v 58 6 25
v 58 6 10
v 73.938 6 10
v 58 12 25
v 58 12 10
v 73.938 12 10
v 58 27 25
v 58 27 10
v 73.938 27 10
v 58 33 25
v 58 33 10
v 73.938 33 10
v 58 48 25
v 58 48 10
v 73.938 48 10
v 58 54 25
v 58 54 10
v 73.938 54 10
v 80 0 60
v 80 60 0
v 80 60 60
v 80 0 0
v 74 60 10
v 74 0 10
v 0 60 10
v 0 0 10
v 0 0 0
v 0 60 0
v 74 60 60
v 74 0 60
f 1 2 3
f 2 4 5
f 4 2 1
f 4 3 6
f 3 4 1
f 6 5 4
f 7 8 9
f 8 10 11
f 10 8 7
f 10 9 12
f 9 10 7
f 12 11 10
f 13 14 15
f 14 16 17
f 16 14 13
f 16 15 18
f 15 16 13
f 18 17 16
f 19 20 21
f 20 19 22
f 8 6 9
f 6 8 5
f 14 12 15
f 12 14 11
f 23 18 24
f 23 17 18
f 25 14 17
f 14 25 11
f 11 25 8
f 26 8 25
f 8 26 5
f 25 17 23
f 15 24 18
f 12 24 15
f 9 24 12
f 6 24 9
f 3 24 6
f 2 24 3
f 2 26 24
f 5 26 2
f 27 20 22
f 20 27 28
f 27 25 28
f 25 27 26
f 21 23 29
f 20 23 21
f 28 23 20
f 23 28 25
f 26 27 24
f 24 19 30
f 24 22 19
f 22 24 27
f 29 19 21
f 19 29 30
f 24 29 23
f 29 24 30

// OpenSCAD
$fn = 32;

// ----------------------------------------------------------------------
// Rib bracket: 3-gusset L bracket
// ----------------------------------------------------------------------

// --- parameters (mm) ---
base_l = 80;              // foot length, X
base_w = 60;              // foot width, Y
base_t = 10;              // foot thickness
plate_t = 6;              // upright plate thickness
plate_h = 60;             // overall height
gus_l = 16;               // gusset leg along the foot
gus_h = 16;               // gusset height
gus_t = 6;                // gusset thickness
gus_edge = 6;             // gusset margin from the foot edge
n_gus = 3;                // gusset count

gus_pitch = (base_w - 2 * gus_edge - gus_t) / (n_gus - 1);  // gusset pitch

union() {
  cube([base_l, base_w, base_t]);
  translate([base_l - plate_t, 0, base_t - 1])
    cube([plate_t, base_w, plate_h - base_t + 1]);
  for (i = [0 : n_gus - 1])
    translate([base_l - plate_t - gus_l, gus_edge + i * gus_pitch, base_t - 1])
      rotate([-90, 0, 0])
        linear_extrude(height = gus_t)
          polygon(points = [[0, 0], [gus_l + 1, 0], [0, -gus_h]]);
}
